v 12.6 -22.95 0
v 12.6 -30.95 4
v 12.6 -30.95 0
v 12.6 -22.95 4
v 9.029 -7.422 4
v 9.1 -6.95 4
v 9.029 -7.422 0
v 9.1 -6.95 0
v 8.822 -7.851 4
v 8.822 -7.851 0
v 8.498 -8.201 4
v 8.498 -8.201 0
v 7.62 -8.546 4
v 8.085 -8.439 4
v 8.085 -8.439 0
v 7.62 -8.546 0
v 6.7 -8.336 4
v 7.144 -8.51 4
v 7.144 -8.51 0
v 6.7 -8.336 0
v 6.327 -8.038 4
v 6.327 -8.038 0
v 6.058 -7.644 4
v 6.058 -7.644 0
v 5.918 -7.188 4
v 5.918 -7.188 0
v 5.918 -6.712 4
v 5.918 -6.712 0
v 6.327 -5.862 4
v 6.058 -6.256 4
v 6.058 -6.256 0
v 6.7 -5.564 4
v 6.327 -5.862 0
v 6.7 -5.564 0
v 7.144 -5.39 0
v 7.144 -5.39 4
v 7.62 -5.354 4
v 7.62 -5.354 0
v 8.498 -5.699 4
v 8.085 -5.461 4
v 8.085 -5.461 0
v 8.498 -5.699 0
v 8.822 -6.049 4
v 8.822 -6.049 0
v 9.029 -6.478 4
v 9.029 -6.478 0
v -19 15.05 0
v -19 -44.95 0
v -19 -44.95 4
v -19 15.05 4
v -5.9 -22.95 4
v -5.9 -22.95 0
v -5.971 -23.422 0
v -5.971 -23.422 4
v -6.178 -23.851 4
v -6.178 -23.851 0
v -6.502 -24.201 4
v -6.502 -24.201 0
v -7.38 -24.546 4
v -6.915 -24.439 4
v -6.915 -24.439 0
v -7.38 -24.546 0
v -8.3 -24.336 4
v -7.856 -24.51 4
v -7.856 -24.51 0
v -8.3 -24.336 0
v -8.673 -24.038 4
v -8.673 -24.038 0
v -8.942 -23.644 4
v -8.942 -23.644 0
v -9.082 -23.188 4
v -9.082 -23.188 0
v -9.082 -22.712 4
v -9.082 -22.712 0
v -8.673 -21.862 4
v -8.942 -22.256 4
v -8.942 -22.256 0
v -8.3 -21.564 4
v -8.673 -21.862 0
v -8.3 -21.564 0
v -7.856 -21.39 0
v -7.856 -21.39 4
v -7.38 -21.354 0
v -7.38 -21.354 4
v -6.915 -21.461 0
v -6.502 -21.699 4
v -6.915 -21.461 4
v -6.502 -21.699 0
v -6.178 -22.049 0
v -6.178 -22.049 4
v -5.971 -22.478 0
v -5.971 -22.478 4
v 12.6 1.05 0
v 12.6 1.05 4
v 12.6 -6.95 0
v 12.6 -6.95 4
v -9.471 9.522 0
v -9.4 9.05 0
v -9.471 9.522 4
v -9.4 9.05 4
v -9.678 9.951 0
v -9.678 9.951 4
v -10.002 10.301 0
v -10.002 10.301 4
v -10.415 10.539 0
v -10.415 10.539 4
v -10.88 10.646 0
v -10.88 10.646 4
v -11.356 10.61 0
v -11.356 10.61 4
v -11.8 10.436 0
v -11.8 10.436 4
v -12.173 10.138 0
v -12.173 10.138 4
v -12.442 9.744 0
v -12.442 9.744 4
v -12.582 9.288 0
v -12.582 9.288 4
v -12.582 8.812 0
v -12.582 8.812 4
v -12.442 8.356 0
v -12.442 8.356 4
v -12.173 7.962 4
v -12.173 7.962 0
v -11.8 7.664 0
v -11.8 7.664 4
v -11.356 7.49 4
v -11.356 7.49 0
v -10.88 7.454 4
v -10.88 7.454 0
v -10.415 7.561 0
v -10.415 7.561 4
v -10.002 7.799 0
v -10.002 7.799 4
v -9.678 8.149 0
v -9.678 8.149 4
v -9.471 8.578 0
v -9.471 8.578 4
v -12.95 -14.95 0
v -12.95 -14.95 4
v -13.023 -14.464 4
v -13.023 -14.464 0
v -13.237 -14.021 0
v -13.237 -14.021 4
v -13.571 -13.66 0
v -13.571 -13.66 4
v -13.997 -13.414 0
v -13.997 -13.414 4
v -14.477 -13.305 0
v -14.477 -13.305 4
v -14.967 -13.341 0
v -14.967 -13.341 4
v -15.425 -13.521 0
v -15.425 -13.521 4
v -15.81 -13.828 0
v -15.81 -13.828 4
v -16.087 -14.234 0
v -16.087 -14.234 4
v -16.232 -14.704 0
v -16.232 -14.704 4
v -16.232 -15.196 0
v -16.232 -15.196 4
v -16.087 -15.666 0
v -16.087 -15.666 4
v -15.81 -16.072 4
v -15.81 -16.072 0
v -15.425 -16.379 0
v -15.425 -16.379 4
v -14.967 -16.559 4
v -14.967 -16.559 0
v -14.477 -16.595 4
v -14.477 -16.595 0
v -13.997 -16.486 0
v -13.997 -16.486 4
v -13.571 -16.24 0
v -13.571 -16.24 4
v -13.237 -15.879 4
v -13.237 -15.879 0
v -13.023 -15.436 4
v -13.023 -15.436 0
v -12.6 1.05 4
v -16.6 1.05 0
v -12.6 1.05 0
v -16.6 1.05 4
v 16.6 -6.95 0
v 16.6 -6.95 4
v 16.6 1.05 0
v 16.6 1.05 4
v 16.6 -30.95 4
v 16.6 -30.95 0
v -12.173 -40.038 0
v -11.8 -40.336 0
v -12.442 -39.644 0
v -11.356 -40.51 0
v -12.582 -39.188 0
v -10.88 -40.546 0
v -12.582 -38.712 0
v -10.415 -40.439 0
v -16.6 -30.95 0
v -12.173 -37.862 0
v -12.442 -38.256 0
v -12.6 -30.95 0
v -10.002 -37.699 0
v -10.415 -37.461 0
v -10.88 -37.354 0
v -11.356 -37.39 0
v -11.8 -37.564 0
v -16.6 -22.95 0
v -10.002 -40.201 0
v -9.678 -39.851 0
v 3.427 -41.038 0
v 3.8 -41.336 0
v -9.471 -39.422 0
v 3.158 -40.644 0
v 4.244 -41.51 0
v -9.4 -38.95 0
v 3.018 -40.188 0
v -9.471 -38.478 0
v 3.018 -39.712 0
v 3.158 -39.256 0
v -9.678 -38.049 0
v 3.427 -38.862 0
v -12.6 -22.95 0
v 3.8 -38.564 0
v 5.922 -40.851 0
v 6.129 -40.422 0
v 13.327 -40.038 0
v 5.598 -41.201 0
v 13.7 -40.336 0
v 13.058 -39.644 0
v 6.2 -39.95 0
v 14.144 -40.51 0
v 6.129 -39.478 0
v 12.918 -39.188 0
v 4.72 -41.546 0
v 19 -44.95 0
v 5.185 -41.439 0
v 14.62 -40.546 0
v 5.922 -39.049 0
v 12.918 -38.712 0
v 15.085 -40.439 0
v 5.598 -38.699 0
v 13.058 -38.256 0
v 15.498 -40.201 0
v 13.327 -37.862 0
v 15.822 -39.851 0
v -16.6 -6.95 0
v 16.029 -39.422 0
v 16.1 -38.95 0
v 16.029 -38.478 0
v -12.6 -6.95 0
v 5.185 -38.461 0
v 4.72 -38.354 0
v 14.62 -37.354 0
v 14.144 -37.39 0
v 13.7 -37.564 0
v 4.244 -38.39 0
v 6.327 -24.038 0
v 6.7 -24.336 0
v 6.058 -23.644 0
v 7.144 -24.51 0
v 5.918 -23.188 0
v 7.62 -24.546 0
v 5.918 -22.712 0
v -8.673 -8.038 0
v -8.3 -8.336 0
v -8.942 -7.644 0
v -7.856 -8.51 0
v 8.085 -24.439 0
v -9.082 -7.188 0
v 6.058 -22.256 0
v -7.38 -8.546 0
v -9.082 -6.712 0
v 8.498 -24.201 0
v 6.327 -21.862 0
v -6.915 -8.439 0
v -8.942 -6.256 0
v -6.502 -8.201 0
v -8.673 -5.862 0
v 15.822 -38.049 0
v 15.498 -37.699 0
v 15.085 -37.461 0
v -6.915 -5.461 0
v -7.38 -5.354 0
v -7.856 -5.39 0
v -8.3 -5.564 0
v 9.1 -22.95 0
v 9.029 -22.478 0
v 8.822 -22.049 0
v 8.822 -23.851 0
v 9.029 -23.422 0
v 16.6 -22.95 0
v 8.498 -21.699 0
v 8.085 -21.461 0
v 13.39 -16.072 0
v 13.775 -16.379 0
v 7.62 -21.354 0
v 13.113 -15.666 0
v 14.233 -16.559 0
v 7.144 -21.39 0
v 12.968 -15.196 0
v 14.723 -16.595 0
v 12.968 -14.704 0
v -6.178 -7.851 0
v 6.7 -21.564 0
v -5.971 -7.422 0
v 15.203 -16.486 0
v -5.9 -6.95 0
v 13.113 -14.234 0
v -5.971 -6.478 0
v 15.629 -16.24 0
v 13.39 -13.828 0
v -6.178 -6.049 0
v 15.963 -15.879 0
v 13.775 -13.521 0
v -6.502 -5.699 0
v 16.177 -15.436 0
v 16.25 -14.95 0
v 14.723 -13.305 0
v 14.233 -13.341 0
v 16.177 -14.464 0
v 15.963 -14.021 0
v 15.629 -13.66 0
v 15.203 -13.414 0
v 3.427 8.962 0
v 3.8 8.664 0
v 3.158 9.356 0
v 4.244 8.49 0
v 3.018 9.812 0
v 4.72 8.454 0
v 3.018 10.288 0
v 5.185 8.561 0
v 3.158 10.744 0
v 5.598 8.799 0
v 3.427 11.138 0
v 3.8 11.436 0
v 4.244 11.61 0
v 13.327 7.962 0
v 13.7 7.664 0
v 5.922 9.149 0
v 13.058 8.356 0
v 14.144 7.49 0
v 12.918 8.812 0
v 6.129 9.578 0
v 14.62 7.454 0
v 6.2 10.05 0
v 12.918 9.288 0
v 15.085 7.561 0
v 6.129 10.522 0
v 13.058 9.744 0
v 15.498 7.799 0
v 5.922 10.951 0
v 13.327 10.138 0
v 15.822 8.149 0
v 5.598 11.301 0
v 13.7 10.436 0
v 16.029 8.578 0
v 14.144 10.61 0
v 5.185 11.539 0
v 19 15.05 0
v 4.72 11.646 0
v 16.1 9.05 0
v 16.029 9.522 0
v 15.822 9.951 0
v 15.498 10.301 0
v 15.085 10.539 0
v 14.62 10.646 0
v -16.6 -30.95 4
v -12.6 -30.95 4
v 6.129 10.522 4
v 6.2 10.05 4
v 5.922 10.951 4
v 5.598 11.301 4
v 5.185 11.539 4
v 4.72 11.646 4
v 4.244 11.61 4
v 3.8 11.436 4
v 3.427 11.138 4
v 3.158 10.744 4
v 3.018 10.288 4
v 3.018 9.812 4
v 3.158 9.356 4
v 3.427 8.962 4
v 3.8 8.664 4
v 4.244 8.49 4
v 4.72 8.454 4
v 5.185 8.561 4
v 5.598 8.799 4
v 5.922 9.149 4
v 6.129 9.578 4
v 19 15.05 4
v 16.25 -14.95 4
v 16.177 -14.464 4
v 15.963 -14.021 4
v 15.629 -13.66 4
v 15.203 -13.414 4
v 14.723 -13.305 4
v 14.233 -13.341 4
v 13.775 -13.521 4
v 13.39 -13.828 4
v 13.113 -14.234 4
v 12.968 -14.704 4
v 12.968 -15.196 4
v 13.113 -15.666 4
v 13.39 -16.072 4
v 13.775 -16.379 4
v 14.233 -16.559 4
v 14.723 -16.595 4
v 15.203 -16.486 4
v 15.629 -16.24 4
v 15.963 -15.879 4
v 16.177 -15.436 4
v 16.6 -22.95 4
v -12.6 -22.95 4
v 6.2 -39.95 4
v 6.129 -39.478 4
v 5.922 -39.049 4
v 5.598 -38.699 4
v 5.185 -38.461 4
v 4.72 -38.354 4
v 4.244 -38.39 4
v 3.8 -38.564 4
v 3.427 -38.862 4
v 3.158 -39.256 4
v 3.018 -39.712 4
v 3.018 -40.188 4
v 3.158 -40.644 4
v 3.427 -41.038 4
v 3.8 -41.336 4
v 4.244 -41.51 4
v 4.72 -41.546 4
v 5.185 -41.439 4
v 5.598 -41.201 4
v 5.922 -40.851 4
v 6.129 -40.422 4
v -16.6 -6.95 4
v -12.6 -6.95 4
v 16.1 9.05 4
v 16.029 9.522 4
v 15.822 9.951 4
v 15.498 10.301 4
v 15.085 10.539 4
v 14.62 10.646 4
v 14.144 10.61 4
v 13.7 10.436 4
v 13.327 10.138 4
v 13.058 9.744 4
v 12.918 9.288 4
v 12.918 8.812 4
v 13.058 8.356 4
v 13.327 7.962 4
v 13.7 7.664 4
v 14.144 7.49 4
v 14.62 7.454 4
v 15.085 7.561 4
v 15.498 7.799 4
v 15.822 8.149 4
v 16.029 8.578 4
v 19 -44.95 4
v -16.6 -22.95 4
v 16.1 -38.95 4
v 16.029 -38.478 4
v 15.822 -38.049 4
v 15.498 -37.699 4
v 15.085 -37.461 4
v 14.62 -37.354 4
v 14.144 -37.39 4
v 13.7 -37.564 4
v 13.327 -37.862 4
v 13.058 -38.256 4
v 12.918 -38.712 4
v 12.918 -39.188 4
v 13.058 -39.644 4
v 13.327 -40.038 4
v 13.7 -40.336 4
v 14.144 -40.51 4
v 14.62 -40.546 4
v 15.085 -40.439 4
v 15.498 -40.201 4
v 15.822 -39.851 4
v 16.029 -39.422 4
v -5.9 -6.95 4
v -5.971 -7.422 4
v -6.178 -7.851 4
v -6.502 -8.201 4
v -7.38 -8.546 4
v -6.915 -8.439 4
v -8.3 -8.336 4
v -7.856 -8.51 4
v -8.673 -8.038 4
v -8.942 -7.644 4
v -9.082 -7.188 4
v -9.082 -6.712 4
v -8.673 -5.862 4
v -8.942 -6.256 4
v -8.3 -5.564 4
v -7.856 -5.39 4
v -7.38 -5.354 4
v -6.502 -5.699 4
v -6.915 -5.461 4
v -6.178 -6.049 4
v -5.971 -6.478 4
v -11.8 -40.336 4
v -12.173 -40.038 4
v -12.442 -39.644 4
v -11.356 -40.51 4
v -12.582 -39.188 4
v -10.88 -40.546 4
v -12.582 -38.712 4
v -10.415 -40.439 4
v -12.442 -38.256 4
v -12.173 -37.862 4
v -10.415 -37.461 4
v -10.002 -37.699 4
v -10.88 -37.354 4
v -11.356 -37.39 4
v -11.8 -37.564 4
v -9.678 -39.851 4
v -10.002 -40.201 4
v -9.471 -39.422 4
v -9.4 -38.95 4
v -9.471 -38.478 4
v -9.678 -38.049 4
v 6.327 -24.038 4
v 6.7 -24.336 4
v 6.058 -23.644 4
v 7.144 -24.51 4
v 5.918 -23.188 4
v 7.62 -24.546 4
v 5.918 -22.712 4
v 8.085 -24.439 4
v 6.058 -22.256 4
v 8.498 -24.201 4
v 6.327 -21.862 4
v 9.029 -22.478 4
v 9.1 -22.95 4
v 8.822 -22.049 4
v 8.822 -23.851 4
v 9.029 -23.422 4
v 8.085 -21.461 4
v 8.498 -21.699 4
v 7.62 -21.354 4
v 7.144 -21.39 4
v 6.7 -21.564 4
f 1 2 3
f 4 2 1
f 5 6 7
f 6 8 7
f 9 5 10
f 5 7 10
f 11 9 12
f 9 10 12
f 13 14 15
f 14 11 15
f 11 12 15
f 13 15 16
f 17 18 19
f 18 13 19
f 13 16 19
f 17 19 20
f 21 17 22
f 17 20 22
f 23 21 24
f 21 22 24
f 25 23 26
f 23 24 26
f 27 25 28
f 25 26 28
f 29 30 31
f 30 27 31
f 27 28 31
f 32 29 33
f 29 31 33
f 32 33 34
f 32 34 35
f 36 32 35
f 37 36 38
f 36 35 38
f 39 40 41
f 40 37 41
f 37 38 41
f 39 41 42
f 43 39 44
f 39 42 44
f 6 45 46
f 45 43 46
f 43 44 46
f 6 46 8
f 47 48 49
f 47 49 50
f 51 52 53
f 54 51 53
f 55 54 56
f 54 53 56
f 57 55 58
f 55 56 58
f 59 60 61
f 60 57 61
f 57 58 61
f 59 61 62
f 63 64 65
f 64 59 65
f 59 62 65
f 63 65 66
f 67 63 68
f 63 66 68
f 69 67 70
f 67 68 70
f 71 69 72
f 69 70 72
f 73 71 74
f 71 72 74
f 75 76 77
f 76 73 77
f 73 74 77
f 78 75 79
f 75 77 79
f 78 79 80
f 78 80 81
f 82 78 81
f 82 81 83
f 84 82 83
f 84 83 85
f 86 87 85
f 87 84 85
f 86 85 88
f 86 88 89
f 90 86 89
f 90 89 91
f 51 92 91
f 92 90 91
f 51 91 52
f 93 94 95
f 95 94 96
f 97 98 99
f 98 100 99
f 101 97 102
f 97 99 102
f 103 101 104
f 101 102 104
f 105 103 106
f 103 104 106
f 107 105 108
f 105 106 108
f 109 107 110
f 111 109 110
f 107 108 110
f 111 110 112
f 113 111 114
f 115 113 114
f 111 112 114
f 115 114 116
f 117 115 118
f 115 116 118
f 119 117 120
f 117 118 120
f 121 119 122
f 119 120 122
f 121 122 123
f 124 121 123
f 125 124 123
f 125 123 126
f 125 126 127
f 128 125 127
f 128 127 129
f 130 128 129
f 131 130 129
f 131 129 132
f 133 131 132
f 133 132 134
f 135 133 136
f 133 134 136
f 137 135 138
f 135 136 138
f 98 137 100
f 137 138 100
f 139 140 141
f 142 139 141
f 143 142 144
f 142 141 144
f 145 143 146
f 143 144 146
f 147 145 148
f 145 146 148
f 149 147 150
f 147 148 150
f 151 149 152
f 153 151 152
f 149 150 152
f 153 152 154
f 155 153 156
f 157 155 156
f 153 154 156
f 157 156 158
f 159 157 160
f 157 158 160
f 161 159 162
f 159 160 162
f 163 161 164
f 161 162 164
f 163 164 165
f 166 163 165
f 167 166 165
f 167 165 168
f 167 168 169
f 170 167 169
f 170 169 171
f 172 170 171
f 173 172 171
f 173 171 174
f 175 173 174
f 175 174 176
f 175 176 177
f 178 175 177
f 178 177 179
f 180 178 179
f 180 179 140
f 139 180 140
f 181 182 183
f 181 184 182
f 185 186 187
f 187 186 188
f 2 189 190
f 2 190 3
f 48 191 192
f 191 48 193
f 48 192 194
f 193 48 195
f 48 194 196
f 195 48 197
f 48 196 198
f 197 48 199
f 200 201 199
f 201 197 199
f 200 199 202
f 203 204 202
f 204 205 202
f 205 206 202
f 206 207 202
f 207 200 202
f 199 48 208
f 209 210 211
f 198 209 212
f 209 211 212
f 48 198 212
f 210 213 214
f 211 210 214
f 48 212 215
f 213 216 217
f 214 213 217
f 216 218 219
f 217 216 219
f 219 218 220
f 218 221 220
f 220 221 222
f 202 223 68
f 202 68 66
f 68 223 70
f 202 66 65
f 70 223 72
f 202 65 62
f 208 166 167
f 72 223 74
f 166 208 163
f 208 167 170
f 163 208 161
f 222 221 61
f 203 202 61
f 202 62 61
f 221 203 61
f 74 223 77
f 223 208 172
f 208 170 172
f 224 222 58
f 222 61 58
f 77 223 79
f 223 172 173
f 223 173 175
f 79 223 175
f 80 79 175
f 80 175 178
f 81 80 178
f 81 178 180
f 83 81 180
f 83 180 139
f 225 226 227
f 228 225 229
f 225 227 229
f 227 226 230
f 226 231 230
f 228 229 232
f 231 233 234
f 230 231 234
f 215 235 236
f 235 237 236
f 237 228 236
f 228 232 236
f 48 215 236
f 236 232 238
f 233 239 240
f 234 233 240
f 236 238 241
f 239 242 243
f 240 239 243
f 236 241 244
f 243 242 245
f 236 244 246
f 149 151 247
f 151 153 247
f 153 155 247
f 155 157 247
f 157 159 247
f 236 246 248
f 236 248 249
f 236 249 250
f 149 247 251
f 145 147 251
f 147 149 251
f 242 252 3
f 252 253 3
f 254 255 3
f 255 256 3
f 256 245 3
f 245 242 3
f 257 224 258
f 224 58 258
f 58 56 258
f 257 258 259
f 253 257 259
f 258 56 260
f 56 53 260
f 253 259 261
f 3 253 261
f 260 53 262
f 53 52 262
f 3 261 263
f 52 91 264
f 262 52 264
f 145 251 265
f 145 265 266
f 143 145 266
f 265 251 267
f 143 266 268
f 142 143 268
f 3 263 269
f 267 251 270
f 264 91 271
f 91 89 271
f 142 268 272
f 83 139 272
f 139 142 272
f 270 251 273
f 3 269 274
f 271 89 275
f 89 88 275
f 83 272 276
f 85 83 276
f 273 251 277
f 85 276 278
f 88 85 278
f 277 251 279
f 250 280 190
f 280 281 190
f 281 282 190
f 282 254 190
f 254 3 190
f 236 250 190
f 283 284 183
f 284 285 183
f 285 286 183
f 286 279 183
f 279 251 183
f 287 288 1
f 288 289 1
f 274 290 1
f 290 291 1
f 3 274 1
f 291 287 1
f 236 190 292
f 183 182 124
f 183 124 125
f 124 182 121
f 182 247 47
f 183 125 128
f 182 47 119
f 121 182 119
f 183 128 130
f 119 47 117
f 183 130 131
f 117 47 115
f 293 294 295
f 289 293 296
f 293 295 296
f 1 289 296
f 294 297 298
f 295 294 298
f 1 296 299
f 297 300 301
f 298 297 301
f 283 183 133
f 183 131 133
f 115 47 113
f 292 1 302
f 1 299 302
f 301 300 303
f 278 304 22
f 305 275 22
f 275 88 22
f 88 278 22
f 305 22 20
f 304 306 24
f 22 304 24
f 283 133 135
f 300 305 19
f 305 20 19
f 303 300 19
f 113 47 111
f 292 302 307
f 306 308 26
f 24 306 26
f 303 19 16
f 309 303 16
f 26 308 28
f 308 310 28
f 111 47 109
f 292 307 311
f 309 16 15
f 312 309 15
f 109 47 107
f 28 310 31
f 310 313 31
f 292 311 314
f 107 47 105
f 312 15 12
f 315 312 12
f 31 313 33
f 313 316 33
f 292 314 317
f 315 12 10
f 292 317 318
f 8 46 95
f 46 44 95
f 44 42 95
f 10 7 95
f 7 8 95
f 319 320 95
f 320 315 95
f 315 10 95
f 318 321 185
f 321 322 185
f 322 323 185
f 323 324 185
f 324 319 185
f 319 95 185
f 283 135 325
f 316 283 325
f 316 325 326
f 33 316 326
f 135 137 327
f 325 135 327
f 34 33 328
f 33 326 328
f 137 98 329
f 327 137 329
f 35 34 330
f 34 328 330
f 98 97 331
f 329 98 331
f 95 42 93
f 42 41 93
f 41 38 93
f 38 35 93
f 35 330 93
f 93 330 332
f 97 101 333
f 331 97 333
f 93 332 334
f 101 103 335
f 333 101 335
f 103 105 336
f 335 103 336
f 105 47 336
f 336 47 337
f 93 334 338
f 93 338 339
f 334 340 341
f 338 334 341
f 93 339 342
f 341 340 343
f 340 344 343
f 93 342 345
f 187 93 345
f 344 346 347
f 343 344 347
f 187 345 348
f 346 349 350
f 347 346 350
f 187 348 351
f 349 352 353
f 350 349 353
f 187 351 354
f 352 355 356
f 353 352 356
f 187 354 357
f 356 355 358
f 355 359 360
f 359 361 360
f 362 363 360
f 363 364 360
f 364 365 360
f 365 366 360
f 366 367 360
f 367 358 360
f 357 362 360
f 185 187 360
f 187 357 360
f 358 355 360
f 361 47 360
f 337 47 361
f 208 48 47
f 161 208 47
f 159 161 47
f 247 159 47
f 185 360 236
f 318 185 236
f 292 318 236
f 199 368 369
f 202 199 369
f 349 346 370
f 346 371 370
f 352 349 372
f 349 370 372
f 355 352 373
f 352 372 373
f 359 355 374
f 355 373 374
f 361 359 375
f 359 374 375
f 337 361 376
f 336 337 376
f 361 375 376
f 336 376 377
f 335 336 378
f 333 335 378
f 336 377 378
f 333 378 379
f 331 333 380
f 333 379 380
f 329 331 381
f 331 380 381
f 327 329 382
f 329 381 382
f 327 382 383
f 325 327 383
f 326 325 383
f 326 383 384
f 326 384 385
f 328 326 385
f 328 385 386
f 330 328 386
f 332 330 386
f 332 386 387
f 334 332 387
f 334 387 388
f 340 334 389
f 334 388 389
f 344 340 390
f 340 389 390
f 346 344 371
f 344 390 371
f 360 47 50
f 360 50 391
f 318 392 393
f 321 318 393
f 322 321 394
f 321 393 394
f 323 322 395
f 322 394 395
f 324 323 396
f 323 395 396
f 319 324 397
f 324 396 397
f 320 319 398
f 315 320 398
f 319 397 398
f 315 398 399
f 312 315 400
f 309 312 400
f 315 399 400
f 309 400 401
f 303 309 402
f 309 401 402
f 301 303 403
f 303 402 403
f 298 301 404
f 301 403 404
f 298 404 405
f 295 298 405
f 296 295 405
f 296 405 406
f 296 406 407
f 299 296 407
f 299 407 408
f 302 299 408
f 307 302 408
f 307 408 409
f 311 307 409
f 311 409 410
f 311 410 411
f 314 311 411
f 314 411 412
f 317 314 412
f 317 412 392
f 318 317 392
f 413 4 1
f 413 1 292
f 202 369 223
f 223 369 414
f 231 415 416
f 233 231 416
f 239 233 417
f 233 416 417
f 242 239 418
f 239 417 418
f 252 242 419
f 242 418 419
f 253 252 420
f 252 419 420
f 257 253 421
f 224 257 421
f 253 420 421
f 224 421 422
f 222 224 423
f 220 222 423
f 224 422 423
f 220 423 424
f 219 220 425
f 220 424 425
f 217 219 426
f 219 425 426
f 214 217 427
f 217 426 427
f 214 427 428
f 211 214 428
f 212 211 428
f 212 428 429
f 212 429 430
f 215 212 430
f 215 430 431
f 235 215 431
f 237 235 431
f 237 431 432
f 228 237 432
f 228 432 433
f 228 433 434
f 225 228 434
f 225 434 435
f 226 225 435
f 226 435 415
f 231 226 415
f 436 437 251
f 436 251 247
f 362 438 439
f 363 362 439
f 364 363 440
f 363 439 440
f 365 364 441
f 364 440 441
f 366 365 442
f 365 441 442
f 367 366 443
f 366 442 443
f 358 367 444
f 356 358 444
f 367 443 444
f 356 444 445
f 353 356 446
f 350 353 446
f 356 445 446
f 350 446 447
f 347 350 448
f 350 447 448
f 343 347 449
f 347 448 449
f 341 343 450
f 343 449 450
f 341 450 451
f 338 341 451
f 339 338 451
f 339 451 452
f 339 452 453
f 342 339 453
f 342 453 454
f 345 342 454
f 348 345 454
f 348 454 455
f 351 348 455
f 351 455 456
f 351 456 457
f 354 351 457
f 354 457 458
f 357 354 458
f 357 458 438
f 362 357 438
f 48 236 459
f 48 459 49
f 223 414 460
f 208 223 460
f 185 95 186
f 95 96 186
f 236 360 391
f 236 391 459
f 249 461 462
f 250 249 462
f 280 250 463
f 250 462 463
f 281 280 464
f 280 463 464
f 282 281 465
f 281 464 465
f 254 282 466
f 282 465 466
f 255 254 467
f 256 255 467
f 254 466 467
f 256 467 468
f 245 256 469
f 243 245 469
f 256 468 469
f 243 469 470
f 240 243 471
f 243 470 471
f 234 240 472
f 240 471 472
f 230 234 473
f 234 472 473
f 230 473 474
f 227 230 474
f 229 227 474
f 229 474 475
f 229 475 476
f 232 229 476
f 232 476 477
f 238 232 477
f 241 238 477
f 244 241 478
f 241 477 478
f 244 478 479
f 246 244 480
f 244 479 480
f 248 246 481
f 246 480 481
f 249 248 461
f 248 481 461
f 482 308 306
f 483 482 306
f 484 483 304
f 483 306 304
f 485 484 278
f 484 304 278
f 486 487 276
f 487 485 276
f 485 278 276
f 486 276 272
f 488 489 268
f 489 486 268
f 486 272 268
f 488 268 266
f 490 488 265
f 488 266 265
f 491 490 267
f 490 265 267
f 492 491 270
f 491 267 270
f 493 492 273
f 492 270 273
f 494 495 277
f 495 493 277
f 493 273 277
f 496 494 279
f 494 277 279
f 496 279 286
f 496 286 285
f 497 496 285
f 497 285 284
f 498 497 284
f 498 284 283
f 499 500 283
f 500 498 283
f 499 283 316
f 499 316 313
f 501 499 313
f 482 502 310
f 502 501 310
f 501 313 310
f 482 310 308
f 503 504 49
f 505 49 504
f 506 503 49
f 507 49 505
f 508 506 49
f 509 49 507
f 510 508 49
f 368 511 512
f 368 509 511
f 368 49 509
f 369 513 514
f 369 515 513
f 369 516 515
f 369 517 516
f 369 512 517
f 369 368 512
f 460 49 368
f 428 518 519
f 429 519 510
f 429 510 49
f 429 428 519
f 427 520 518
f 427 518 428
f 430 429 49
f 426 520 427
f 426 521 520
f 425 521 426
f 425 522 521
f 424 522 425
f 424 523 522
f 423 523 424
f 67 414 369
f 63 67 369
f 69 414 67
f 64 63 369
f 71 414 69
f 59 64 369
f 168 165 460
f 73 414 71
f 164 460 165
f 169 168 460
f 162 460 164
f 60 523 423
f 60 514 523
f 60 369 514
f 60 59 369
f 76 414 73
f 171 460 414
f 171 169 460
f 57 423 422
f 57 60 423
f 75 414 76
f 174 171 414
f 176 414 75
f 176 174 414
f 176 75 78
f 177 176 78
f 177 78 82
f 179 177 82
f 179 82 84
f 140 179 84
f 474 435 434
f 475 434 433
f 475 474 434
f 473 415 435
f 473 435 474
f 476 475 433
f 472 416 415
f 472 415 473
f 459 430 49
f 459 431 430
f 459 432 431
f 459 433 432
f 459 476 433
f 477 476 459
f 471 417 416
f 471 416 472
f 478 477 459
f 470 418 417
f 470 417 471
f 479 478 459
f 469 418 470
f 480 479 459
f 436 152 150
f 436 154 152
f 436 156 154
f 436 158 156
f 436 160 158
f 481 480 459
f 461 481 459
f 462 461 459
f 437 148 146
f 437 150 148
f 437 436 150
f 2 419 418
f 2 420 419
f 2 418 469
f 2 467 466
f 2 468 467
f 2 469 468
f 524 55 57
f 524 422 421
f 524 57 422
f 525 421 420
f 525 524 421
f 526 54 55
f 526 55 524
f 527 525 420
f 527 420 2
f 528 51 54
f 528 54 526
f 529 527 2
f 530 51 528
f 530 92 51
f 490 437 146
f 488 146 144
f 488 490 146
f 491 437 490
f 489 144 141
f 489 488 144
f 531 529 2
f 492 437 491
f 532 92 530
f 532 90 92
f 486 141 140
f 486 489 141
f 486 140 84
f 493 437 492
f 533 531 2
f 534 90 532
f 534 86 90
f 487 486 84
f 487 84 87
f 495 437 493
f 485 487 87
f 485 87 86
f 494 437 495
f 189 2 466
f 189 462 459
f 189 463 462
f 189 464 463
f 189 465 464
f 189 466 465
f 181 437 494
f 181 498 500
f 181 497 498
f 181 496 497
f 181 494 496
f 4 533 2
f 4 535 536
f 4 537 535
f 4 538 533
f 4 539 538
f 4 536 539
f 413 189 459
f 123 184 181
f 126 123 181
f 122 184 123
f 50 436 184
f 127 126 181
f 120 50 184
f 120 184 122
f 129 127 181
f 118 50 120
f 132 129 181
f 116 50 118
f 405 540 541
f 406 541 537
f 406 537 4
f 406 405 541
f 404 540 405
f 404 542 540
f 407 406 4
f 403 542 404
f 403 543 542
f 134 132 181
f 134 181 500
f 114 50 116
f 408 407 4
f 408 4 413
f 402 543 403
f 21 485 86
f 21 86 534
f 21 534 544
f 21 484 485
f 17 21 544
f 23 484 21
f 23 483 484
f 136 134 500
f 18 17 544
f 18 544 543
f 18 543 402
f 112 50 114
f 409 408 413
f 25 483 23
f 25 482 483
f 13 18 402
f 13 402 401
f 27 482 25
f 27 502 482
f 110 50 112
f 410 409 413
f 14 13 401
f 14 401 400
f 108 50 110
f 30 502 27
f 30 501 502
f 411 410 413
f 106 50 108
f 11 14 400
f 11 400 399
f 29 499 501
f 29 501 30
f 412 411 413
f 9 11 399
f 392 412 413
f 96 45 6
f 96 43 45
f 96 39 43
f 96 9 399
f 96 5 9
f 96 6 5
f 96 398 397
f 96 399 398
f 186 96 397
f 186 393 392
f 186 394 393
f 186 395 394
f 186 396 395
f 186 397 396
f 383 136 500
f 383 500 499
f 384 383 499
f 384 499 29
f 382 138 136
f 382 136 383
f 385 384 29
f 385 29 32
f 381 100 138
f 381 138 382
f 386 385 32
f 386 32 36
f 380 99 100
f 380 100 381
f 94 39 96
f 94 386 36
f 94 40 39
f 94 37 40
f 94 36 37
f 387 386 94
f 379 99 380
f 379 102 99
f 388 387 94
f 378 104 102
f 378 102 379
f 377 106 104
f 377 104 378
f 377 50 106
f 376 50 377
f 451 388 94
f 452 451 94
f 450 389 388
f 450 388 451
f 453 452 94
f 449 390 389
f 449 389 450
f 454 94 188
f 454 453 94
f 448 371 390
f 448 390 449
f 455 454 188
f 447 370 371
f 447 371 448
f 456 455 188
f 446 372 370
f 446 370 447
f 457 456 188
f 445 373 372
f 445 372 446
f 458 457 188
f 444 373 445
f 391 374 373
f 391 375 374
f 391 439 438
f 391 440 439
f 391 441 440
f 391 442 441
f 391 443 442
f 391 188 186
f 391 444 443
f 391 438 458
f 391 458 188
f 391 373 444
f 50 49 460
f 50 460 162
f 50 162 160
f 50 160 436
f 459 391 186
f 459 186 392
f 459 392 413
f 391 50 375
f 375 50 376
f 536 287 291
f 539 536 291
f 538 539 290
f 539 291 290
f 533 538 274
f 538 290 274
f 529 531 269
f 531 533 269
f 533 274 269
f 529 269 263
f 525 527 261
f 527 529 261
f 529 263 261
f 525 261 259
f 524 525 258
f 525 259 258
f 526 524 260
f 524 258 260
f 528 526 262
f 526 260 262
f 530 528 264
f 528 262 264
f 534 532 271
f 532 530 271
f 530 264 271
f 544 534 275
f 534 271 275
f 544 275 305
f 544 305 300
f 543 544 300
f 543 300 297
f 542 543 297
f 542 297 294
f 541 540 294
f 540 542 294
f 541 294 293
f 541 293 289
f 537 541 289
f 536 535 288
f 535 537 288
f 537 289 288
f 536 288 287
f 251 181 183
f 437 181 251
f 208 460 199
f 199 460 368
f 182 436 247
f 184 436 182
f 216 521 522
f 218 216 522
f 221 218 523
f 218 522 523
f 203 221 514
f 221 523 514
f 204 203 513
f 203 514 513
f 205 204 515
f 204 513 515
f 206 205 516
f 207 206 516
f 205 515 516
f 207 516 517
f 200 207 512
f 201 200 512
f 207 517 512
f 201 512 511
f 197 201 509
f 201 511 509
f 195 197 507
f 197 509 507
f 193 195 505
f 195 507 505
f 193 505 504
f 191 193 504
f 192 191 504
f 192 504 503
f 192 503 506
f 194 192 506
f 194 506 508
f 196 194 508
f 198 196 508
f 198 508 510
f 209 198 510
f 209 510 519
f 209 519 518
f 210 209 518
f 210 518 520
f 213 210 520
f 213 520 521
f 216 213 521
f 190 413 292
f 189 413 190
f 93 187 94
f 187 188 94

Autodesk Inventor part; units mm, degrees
ref_plane "YZ Plane" through (0, 0, 0) normal (1, 0, 0) x (0, 1, 0)
ref_plane "XZ Plane" through (0, 0, 0) normal (0, 1, 0) x (-1, 0, 0)
ref_plane "XY Plane" through (0, 0, 0) normal (0, 0, 1) x (1, 0, 0)
sketch "Эскиз1" plane through (0, 0, 0) normal (0, 0, 1) x (1, 0, 0)
  circle A0 centre (-7.5, -6.95) radius 1.5 construction
  circle A1 centre (7.5, -6.95) radius 1.5 construction
  circle A2 centre (-7.5, -22.95) radius 1.5 construction
  circle A3 centre (7.5, -22.95) radius 1.5 construction
  circle A4 centre (-7.5, -6.95) radius 1.6
  circle A5 centre (7.5, -6.95) radius 1.6
  circle A6 centre (7.5, -22.95) radius 1.6
  circle A7 centre (-7.5, -22.95) radius 1.6
  line L0 (-7.5, -6.95) -> (7.5, -22.95) construction
  line L1 (-19, 15.05) -> (19, 15.05)
  line L2 (19, 15.05) -> (19, -44.95)
  line L3 (19, -44.95) -> (-19, -44.95)
  line L4 (-19, -44.95) -> (-19, 15.05)
  line L5 (-19, 15.05) -> (19, -44.95) construction
  line L6 (19, 15.05) -> (-19, -44.95) construction
  point P0 (0, 0)
  point P1 (0, -14.95)
  dimension "d0" = 3.2
  dimension "d1" = 3.2
  dimension "d2" = 3.2
  dimension "d3" = 3.2
  dimension "d4" = 38
  dimension "d5" = 60
extrude "Выдавливание1" add sketch "Эскиз1" along normal blind 4
sketch "Эскиз2" plane through (0, 0, 4) normal (0, 0, 1) x (1, 0, 0)
  circle A0 centre (-7.5, -22.95) radius 1.6 construction
  circle A1 centre (7.5, -6.95) radius 1.6 construction
  circle A2 centre (7.5, -6.95) radius 1.6 construction
  line L0 (-7.5, -22.95) -> (7.5, -6.95) construction
  line L1 (16.6, -30.95) -> (-16.6, -30.95) construction
  line L2 (-16.6, -30.95) -> (-16.6, 1.05) construction
  line L3 (-16.6, 1.05) -> (16.6, 1.05) construction
  line L4 (16.6, 1.05) -> (16.6, -30.95) construction
  line L5 (16.6, -30.95) -> (-16.6, 1.05) construction
  line L6 (-16.6, -30.95) -> (16.6, 1.05) construction
  line L7 (-16.6, -30.95) -> (-12.6, -30.95)
  line L8 (-12.6, -30.95) -> (-12.6, -22.95)
  line L9 (-12.6, -22.95) -> (-16.6, -22.95)
  line L10 (-16.6, -22.95) -> (-16.6, -30.95)
  line L11 (-16.6, 1.05) -> (-12.6, 1.05)
  line L12 (-12.6, 1.05) -> (-12.6, -6.95)
  line L13 (-12.6, -6.95) -> (-16.6, -6.95)
  line L14 (-16.6, -6.95) -> (-16.6, 1.05)
  line L15 (16.6, -30.95) -> (12.6, -30.95)
  line L16 (12.6, -30.95) -> (12.6, -22.95)
  line L17 (12.6, -22.95) -> (16.6, -22.95)
  line L18 (16.6, -22.95) -> (16.6, -30.95)
  line L19 (16.6, 1.05) -> (12.6, 1.05)
  line L20 (12.6, 1.05) -> (12.6, -6.95)
  line L21 (12.6, -6.95) -> (16.6, -6.95)
  line L22 (16.6, -6.95) -> (16.6, 1.05)
  point P0 (0, -14.95)
  dimension "d41" = 33.2
  dimension "d42" = 32
  dimension "d43" = 4
  dimension "d44" = 8
  dimension "d45" = 4
  dimension "d46" = 8
  dimension "d47" = 4
  dimension "d48" = 4
  dimension "d49" = 8
  dimension "d50" = 8
extrude "Выдавливание2" cut sketch "Эскиз2" against normal blind 4
sketch "Эскиз3" plane through (0, 0, 4) normal (0, 0, 1) x (1, 0, 0)
  line L0 (12.6, -22.95) -> (16.6, -22.95) construction
  line L1 (16.6, -6.95) -> (12.6, -6.95) construction
  line L2 (14.6, -22.95) -> (14.6, -6.95) construction
  circle A0 centre (14.6, -14.95) radius 1.65
  line L3 (-19, -44.95) -> (19, -44.95) projected
  line L4 (0, -44.95) -> (0, 15.05) construction
  line L5 (19, 15.05) -> (-19, 15.05) projected
  circle A1 centre (-14.6, -14.95) radius 1.65
  point P0 (0, 0)
  dimension "d18" = 3.3
extrude "Выдавливание3" cut sketch "Эскиз3" against normal blind 10
sketch "Эскиз4" plane through (0, 0, 4) normal (0, 0, 1) x (1, 0, 0)
  line L0 (19, -44.95) -> (19, 15.05) projected
  line L1 (19, -14.95) -> (-2.8531, -14.95) construction
  line L2 (4.6, -39.95) -> (4.6, 10.05) construction
  circle A0 centre (4.6, -39.95) radius 1.6
  circle A1 centre (4.6, 10.05) radius 1.6
  point P0 (0, 0)
  point P1 (4.6, -14.95)
  dimension "d22" = 50
  dimension "d24" = 3.2
  dimension "d25" = 3.2
extrude "Выдавливание4" cut sketch "Эскиз4" against normal blind 10
sketch "Эскиз5" plane through (0, 0, 4) normal (0, 0, 1) x (1, 0, 0)
  line L0 (16.6, -30.95) -> (12.6, -30.95) construction
  line L1 (16.6, 1.05) -> (12.6, 1.05) construction
  line L2 (-12.6, 1.05) -> (-16.6, 1.05) construction
  line L3 (-12.6, -30.95) -> (-16.6, -30.95) construction
  circle A0 centre (14.5, -38.95) radius 1.6
  line L4 (19, -44.95) -> (19, 15.05) projected
  line L5 (19, -14.95) -> (-19, -14.95) construction
  line L6 (-19, 15.05) -> (-19, -44.95) projected
  line L7 (19, 15.05) -> (-19, 15.05) projected
  line L8 (0, 15.05) -> (0, -44.95) construction
  line L9 (-19, -44.95) -> (19, -44.95) projected
  circle A1 centre (14.5, 9.05) radius 1.6
  line L10 (0, -44.95) -> (0, 15.05) construction
  line L11 (-16.6, -30.95) -> (-12.6, -30.95) construction
  line L12 (-16.6, 1.05) -> (-12.6, 1.05) construction
  circle A2 centre (-11, -38.95) radius 1.6
  circle A3 centre (-11, 9.05) radius 1.6
  point P0 (0, 0)
  dimension "d28" = 3.2
  dimension "d33" = 3.2
  dimension "d34" = 3.2
  dimension "d35" = 6
  dimension "d36" = 6
  dimension "d37" = 8
  dimension "d38" = 8
  dimension "d39" = 6
  dimension "d40" = 4.5
extrude "Выдавливание5" cut sketch "Эскиз5" against normal blind 10 contours A0 | A1 | A2 | A3
properties part number "пол_каретки"
